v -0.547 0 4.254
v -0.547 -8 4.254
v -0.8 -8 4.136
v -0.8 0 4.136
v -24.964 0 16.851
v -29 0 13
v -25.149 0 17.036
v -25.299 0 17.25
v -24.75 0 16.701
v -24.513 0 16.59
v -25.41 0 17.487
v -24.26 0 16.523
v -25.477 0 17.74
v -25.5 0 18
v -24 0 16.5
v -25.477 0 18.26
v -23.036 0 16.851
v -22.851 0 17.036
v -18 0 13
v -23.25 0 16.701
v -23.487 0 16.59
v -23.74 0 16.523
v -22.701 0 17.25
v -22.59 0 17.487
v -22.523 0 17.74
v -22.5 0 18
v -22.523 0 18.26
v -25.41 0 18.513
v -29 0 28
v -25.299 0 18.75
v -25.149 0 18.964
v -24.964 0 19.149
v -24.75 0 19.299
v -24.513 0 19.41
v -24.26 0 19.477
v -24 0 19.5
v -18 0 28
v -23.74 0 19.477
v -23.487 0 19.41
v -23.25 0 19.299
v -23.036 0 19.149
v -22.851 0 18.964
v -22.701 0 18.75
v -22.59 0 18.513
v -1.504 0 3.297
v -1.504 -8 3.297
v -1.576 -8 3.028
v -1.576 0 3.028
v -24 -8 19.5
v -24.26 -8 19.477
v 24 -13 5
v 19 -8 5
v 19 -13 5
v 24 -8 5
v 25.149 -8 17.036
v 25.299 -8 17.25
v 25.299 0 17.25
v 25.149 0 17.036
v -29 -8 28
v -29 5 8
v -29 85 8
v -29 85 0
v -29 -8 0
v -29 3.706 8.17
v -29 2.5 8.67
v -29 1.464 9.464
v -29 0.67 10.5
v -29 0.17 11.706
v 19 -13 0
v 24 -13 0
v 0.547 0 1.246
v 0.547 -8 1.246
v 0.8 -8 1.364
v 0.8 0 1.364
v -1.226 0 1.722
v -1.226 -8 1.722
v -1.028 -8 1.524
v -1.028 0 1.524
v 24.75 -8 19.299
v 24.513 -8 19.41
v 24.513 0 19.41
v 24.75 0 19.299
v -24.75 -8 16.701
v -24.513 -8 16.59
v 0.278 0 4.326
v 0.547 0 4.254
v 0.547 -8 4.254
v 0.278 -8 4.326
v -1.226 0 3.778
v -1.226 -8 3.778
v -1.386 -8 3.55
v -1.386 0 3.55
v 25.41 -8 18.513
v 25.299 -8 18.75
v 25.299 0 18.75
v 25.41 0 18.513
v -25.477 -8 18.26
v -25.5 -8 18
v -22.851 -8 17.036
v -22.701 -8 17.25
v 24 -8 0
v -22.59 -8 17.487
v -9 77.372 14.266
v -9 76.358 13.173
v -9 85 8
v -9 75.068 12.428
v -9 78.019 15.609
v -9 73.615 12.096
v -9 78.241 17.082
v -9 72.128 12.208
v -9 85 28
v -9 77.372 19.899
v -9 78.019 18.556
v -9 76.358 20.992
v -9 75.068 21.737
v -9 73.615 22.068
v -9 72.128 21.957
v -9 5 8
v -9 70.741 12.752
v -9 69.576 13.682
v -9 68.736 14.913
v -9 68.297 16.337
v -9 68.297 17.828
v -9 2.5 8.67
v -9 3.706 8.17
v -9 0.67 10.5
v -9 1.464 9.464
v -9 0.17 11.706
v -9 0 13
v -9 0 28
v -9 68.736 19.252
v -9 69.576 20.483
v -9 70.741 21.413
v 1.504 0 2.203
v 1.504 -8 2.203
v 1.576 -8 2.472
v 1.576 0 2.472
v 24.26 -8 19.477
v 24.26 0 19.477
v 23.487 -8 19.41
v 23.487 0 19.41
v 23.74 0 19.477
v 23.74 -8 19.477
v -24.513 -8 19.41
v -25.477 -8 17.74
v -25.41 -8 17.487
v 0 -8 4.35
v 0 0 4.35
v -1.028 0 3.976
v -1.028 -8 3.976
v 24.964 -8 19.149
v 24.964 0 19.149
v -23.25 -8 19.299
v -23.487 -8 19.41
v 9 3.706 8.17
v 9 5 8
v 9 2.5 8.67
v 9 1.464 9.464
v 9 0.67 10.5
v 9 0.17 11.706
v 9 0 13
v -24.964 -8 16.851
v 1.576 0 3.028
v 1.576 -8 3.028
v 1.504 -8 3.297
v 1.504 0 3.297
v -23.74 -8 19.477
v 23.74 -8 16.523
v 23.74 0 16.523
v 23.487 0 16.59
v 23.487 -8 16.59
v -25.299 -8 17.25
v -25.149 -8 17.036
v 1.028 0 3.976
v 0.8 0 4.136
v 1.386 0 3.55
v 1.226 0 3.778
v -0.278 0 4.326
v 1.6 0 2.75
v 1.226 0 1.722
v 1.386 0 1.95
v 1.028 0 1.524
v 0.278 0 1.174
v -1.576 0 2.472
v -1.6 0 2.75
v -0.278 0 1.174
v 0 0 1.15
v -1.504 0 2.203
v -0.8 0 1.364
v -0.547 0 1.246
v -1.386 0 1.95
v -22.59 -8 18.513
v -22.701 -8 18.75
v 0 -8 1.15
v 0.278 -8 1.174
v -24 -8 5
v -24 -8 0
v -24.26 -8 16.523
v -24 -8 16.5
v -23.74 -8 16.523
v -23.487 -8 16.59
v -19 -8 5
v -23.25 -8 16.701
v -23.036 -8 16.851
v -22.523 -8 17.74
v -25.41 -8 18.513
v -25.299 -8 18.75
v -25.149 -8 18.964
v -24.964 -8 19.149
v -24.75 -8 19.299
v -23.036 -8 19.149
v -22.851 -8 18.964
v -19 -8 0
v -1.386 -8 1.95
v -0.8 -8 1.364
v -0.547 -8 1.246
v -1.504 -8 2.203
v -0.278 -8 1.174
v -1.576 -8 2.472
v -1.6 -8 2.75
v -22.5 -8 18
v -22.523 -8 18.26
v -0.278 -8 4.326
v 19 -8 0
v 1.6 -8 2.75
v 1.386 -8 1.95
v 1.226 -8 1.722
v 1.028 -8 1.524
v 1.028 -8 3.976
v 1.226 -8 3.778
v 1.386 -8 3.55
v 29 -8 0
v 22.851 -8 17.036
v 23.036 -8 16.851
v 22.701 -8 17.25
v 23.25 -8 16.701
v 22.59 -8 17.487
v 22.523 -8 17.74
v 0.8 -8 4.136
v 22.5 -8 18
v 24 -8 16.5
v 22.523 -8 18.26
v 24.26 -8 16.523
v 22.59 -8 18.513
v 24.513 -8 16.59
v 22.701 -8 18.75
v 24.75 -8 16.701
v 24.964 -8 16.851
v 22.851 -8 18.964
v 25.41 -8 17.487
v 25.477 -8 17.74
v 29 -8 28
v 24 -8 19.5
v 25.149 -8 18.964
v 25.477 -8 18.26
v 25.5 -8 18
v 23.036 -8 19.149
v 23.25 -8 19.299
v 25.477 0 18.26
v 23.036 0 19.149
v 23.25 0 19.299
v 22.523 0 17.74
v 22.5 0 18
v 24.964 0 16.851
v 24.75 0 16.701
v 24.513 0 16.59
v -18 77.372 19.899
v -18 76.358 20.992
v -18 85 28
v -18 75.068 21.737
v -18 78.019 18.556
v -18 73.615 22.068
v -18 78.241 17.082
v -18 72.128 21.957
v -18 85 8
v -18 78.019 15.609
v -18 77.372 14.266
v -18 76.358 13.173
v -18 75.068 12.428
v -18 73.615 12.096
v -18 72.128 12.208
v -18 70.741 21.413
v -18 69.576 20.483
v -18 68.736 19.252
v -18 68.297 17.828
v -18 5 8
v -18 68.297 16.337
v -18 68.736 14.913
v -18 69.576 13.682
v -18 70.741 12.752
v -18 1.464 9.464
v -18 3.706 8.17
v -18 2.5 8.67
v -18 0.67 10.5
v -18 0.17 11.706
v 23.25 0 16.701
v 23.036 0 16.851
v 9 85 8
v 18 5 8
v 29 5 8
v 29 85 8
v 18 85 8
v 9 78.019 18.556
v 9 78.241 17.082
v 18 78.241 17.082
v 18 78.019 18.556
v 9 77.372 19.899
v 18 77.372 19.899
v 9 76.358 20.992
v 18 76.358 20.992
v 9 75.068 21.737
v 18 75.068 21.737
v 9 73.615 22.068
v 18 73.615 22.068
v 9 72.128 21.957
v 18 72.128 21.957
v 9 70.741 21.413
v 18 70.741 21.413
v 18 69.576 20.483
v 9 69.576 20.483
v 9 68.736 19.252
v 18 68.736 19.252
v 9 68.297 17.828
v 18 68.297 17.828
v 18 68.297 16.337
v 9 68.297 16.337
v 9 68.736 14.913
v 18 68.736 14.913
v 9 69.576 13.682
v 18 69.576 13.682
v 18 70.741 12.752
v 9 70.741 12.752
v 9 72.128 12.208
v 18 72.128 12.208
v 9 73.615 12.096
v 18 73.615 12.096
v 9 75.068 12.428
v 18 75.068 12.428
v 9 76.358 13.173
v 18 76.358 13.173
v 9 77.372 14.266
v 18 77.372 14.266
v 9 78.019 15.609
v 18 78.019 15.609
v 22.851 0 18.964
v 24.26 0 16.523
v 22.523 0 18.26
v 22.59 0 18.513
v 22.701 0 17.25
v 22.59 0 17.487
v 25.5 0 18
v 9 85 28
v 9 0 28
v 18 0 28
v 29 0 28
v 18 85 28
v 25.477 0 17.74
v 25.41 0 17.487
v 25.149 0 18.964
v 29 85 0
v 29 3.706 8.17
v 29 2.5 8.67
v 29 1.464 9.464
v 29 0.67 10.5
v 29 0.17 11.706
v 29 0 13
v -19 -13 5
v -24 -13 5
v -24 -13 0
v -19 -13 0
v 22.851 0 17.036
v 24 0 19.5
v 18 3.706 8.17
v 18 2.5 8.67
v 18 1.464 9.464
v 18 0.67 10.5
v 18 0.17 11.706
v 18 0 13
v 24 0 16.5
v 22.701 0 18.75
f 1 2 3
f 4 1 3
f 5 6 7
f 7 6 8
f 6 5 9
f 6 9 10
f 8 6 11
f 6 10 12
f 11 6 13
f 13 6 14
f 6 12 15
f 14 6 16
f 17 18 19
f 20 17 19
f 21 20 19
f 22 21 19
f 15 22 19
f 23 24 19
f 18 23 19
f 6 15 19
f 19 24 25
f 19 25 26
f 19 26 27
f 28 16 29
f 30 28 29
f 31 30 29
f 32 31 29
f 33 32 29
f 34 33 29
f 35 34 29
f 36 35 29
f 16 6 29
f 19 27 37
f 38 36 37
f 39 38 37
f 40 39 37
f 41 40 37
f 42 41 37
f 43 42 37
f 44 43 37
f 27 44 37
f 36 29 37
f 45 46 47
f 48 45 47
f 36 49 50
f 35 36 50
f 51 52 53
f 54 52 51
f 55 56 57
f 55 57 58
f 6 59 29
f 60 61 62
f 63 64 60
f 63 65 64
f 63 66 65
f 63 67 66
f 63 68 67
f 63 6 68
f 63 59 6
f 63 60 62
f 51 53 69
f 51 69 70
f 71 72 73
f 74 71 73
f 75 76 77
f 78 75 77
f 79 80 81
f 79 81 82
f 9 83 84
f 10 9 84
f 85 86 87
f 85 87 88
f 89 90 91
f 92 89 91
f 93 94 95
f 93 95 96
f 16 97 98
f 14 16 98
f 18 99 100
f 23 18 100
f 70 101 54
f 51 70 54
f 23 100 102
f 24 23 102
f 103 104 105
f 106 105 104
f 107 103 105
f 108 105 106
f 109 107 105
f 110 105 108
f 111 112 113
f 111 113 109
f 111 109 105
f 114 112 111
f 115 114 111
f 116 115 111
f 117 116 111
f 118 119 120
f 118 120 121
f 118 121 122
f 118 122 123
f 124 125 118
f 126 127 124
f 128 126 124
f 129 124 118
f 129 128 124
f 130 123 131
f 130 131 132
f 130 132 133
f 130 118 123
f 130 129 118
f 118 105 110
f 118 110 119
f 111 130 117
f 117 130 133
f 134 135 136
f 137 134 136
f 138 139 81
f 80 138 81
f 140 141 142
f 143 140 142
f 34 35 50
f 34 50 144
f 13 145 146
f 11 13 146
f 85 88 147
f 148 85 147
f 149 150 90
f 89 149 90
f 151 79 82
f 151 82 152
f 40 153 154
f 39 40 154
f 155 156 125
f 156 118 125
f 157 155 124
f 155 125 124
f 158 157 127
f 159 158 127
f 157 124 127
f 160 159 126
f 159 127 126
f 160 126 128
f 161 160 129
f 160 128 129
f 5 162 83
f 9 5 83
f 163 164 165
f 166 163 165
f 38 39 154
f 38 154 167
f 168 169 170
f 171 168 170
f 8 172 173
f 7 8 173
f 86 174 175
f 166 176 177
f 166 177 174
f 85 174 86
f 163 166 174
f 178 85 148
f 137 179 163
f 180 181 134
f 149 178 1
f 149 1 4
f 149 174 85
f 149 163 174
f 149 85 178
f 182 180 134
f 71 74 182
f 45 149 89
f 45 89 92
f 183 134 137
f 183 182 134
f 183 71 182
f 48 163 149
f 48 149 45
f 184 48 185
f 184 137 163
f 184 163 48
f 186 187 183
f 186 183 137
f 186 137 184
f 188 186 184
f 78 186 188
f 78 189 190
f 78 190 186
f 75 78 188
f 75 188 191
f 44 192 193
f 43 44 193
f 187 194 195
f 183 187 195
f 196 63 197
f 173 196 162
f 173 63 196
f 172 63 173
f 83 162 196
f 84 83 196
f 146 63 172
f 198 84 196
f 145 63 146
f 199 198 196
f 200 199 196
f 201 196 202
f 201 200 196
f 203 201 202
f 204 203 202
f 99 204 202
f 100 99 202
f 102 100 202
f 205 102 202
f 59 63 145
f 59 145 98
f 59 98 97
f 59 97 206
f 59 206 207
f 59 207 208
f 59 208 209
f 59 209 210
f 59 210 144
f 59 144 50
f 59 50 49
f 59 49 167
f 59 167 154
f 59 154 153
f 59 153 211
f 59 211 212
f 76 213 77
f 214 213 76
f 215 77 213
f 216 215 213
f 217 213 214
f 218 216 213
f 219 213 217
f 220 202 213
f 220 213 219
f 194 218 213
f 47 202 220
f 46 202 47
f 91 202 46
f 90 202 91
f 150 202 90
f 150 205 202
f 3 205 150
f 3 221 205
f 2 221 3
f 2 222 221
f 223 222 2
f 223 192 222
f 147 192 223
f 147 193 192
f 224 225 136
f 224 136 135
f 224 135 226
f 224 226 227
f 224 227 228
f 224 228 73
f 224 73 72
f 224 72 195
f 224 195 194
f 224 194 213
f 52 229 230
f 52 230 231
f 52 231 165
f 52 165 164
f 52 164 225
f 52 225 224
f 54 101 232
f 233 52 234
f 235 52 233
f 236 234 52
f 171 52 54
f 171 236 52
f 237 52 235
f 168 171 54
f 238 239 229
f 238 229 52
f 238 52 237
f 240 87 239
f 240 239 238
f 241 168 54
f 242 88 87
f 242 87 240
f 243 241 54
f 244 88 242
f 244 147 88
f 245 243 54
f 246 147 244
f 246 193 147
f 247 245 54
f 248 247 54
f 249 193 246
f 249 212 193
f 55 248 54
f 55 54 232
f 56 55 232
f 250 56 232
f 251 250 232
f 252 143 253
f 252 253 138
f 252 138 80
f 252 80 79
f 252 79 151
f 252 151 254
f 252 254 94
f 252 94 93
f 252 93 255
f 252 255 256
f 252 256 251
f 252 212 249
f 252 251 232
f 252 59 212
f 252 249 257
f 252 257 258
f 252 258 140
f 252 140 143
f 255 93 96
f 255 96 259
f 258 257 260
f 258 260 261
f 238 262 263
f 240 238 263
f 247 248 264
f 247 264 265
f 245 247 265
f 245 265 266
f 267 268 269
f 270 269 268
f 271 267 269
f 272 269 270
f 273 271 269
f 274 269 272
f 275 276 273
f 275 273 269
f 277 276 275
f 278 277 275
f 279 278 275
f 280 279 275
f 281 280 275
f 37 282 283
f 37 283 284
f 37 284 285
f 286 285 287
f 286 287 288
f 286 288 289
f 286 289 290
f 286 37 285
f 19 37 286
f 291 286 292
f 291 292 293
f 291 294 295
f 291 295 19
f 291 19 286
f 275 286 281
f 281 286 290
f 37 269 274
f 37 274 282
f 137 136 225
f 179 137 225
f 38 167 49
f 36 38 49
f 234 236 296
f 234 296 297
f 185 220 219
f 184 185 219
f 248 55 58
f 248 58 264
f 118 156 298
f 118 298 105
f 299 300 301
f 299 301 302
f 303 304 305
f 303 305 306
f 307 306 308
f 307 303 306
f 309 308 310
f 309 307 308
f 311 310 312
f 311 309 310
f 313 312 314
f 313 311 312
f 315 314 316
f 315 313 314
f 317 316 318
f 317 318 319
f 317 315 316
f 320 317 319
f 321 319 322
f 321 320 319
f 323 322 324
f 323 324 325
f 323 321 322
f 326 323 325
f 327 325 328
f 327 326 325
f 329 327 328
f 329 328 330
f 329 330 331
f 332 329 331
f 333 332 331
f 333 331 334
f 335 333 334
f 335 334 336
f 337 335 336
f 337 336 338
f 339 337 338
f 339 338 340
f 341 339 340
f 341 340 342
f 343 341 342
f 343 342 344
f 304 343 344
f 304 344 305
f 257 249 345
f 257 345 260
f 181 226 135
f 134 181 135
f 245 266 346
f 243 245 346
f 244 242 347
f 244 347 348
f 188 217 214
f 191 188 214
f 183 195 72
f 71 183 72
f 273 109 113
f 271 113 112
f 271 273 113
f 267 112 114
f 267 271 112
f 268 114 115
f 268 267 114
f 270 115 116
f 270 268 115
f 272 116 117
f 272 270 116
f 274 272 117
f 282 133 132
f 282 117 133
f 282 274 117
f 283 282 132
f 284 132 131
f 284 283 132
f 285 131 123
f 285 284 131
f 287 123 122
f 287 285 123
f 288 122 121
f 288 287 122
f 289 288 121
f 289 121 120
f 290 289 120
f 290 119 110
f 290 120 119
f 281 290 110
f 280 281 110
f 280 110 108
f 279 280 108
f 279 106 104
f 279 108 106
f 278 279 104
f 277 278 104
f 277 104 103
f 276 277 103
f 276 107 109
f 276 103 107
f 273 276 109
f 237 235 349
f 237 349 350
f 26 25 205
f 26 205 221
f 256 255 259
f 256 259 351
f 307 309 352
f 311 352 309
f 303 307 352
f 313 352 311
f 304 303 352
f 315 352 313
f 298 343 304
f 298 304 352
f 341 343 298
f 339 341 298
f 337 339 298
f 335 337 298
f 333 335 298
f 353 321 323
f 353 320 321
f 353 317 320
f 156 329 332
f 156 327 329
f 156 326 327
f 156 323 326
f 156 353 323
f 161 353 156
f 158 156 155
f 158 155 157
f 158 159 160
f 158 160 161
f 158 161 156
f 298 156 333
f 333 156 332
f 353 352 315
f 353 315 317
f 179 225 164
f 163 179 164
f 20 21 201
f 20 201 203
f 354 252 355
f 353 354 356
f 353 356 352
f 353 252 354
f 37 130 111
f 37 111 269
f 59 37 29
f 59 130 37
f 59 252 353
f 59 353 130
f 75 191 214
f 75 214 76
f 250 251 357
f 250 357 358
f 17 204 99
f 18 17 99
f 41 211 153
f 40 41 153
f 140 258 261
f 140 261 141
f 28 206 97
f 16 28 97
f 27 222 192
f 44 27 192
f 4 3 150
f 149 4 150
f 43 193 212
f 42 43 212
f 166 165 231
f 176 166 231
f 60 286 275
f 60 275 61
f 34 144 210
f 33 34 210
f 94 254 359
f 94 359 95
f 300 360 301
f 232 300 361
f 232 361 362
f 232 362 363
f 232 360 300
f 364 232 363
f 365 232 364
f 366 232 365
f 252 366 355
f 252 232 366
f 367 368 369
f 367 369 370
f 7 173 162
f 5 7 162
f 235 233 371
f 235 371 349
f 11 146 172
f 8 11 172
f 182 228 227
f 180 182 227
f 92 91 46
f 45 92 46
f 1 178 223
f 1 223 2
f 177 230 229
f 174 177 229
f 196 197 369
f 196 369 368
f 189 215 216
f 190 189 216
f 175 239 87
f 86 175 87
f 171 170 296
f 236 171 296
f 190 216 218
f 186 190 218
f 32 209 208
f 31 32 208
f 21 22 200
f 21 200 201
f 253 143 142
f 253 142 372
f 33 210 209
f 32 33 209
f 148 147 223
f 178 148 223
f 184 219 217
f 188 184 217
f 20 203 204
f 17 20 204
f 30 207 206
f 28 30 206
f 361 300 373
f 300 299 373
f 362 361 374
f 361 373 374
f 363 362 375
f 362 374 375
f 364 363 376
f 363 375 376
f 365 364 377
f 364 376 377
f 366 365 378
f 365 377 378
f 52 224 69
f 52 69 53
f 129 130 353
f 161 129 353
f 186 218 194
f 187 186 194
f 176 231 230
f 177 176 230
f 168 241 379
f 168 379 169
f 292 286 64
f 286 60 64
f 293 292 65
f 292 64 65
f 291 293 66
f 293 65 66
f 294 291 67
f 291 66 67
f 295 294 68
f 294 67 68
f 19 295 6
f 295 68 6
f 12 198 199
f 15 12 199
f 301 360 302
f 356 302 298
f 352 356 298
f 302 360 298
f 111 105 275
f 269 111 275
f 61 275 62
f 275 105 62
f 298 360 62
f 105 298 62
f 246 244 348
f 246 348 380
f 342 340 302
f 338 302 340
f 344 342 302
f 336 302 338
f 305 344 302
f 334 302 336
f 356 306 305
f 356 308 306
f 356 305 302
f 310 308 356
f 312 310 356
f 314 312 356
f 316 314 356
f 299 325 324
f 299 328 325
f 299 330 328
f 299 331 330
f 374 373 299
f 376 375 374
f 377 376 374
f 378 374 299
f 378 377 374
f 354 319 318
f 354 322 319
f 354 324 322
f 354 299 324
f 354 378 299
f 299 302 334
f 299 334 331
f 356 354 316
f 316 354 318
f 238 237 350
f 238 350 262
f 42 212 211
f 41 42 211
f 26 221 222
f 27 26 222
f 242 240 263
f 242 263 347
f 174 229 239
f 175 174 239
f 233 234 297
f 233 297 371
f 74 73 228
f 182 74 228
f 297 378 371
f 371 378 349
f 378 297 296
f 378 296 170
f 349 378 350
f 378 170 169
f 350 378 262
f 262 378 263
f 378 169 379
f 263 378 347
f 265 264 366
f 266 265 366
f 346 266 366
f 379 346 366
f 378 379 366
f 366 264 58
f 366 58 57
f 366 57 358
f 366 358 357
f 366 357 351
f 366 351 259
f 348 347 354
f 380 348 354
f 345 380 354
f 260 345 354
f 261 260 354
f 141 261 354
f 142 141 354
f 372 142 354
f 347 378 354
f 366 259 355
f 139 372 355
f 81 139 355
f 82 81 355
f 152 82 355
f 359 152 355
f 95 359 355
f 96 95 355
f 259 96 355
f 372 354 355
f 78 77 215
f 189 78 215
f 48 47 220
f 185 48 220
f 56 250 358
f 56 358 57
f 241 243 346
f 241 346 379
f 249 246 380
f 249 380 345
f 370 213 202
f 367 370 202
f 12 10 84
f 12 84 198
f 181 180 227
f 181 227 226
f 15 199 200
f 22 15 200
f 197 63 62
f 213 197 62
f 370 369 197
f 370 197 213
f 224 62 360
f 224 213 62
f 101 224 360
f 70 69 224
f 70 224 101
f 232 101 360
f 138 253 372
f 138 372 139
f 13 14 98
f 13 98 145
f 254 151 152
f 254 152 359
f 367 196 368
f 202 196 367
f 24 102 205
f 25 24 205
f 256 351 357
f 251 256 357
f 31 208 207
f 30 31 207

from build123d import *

# Parameters (mm, degrees)
SKETCH1_W           = 57.999998332
SKETCH1_H           = 28.000000864
BOSS_EXTRUDE1_DEPTH = 8
CUT_EXTRUDE2_REACH  = 43.097
CUT_EXTRUDE3_DEPTH  = 42.097445176
CUT_EXTRUDE4_DEPTH  = 42.097445176
SKETCH8_W           = 5.00000082
SKETCH8_H           = 4.999999888
BOSS_EXTRUDE2_DEPTH = 4.999995232
SKETCH9_W           = 5.00000082
SKETCH9_H           = 4.999999888
BOSS_EXTRUDE3_DEPTH = 4.999995232
BOSS_EXTRUDE4_DEPTH = 85
FILLET1_R           = 5
FILLET2_R           = 5
FILLET3_R           = 5
HOLE1_START         = -18
HOLE1_OUTLINE_R     = 5
HOLE1_DEPTH         = 36


# Read off the part's stored shape, not the designer's step: Hole1
with BuildPart() as part:
    # Sketch1 → Boss-Extrude1 (new body)
    with BuildSketch(Plane.XZ):
        with Locations((0, 14.000000432)):
            Rectangle(SKETCH1_W, SKETCH1_H)
    extrude(amount=BOSS_EXTRUDE1_DEPTH)

    # Sketch3 → Cut-Extrude2 (cut, up to next)
    with BuildSketch(Plane.XZ.offset(8), mode=Mode.PRIVATE) as cut_extrude2_sk1:
        Polygon((0, 4.350000061), (-0.277837098, 4.325692076), (-0.547232223, 4.253508057), (-0.79999998, 4.135640804), (-1.028459985, 3.975670785), (-1.225671032, 3.77845997), (-1.385641051, 3.550000023), (-1.503507956, 3.297232091), (-1.575691975, 3.027837025), (-1.59999996, 2.749999985), (-1.575691975, 2.472162945), (-1.503507956, 2.202768112), (-1.385641051, 1.949999947), (-1.225671032, 1.72154), (-1.028459985, 1.524328953), (-0.79999998, 1.36435905), (-0.547232223, 1.246492029), (-0.277837098, 1.17430801), (0, 1.150000026), (0.277837098, 1.17430801), (0.547232223, 1.246492029), (0.79999998, 1.36435905), (1.028459985, 1.524328953), (1.225671032, 1.72154), (1.385641051, 1.949999947), (1.503507956, 2.202768112), (1.575691975, 2.472162945), (1.59999996, 2.749999985), (1.575691975, 3.027837025), (1.503507956, 3.297232091), (1.385641051, 3.550000023), (1.225671032, 3.77845997), (1.028459985, 3.975670785), (0.79999998, 4.135640804), (0.547232223, 4.253508057), (0.277837098, 4.325692076), align=None)
    cut_extrude2_tool1 = extrude(cut_extrude2_sk1.sketch, amount=-CUT_EXTRUDE2_REACH, mode=Mode.PRIVATE) & part.part
    add(cut_extrude2_tool1.solids().sort_by_distance((0, -8, 2.75))[0], mode=Mode.SUBTRACT)

    # Sketch4 → Cut-Extrude3 (cut, through all)
    with BuildSketch(Plane.XZ.offset(8)):
        Polygon((-23.035820574, 16.850929707), (-22.850930691, 17.03581959), (-22.700959817, 17.249999568), (-22.590460256, 17.486970872), (-22.522790357, 17.739530653), (-22.500000894, 17.999999225), (-22.522790357, 18.26046966), (-22.590460256, 18.513029441), (-22.700959817, 18.750000745), (-22.850930691, 18.964180723), (-23.035820574, 19.149070606), (-23.250000551, 19.299039617), (-23.486969993, 19.409539178), (-23.739529774, 19.477209076), (-24.000000209, 19.500000402), (-24.260470644, 19.477209076), (-24.513030425, 19.409539178), (-24.749999866, 19.299039617), (-24.964179844, 19.149070606), (-25.149069726, 18.964180723), (-25.299040601, 18.750000745), (-25.409540161, 18.513029441), (-25.47721006, 18.26046966), (-25.499999523, 17.999999225), (-25.47721006, 17.739530653), (-25.409540161, 17.486970872), (-25.299040601, 17.249999568), (-25.149069726, 17.03581959), (-24.964179844, 16.850929707), (-24.749999866, 16.700960696), (-24.513030425, 16.590459272), (-24.260470644, 16.522789374), (-24.000000209, 16.499999911), (-23.739529774, 16.522789374), (-23.486969993, 16.590459272), (-23.250000551, 16.700960696), align=None)
    extrude(amount=-CUT_EXTRUDE3_DEPTH, mode=Mode.SUBTRACT)

    # Sketch5 → Cut-Extrude4 (cut, through all)
    with BuildSketch(Plane(origin=(0, -8, 0), x_dir=(-1, 0, 0), z_dir=(0, 1, 0))):
        Polygon((-23.486969993, 16.590459272), (-23.250000551, 16.700960696), (-23.035820574, 16.850929707), (-22.850930691, 17.03581959), (-22.700959817, 17.249999568), (-22.590460256, 17.486970872), (-22.522790357, 17.739530653), (-22.500000894, 17.999999225), (-22.522790357, 18.26046966), (-22.590460256, 18.513029441), (-22.700959817, 18.750000745), (-22.850930691, 18.964180723), (-23.035820574, 19.149070606), (-23.250000551, 19.299039617), (-23.486969993, 19.409539178), (-23.739529774, 19.477209076), (-24.000000209, 19.500000402), (-24.260470644, 19.477209076), (-24.513030425, 19.409539178), (-24.749999866, 19.299039617), (-24.964179844, 19.149070606), (-25.149069726, 18.964180723), (-25.299040601, 18.750000745), (-25.409540161, 18.513029441), (-25.47721006, 18.26046966), (-25.499999523, 17.999999225), (-25.47721006, 17.739530653), (-25.409540161, 17.486970872), (-25.299040601, 17.249999568), (-25.149069726, 17.03581959), (-24.964179844, 16.850929707), (-24.749999866, 16.700960696), (-24.513030425, 16.590459272), (-24.260470644, 16.522789374), (-24.000000209, 16.499999911), (-23.739529774, 16.522789374), align=None)
    extrude(amount=CUT_EXTRUDE4_DEPTH, mode=Mode.SUBTRACT)

    # Sketch8 → Boss-Extrude2 (add)
    with BuildSketch(Plane.XZ.offset(8)):
        with Locations((-21.499999799, 2.499999944)):
            Rectangle(SKETCH8_W, SKETCH8_H)
    extrude(amount=BOSS_EXTRUDE2_DEPTH)

    # Sketch9 → Boss-Extrude3 (add)
    with BuildSketch(Plane.XZ.offset(8)):
        with Locations((21.499999799, 2.499999944)):
            Rectangle(SKETCH9_W, SKETCH9_H)
    extrude(amount=BOSS_EXTRUDE3_DEPTH)

    # Sketch10 → Boss-Extrude4 (add)
    with BuildSketch(Plane(origin=(0, 0, 0), x_dir=(1, 0, 0), z_dir=(0, 1, 0))):
        Polygon((9, -8), (-9, -8), (-9, -28.000000864), (-18, -28.000000864), (-18, -8), (-28.999999166, -8), (-28.999999166, 0), (28.999999166, 0), (28.999999166, -8), (18, -8), (18, -28.000000864), (9, -28.000000864), align=None)
    extrude(amount=BOSS_EXTRUDE4_DEPTH)

    # Fillet1
    fillet1_edges = [part.edges().sort_by_distance(p)[0] for p in [
        (0, 0, 8),
    ]]
    fillet(fillet1_edges, radius=FILLET1_R)

    # Fillet2
    fillet2_edges = [part.edges().sort_by_distance(p)[0] for p in [
        (23.499999583, 0, 8),
    ]]
    fillet(fillet2_edges, radius=FILLET2_R)

    # Fillet3
    fillet3_edges = [part.edges().sort_by_distance(p)[0] for p in [
        (-23.499999583, 0, 8),
    ]]
    fillet(fillet3_edges, radius=FILLET3_R)

    # Hole1 outline → Hole1 (cut)
    with BuildSketch(Plane.YZ.offset(HOLE1_START)):
        with Locations((73.240950457, 17.082405748)):
            Circle(HOLE1_OUTLINE_R)
    extrude(amount=HOLE1_DEPTH, mode=Mode.SUBTRACT)


solid = part.part
